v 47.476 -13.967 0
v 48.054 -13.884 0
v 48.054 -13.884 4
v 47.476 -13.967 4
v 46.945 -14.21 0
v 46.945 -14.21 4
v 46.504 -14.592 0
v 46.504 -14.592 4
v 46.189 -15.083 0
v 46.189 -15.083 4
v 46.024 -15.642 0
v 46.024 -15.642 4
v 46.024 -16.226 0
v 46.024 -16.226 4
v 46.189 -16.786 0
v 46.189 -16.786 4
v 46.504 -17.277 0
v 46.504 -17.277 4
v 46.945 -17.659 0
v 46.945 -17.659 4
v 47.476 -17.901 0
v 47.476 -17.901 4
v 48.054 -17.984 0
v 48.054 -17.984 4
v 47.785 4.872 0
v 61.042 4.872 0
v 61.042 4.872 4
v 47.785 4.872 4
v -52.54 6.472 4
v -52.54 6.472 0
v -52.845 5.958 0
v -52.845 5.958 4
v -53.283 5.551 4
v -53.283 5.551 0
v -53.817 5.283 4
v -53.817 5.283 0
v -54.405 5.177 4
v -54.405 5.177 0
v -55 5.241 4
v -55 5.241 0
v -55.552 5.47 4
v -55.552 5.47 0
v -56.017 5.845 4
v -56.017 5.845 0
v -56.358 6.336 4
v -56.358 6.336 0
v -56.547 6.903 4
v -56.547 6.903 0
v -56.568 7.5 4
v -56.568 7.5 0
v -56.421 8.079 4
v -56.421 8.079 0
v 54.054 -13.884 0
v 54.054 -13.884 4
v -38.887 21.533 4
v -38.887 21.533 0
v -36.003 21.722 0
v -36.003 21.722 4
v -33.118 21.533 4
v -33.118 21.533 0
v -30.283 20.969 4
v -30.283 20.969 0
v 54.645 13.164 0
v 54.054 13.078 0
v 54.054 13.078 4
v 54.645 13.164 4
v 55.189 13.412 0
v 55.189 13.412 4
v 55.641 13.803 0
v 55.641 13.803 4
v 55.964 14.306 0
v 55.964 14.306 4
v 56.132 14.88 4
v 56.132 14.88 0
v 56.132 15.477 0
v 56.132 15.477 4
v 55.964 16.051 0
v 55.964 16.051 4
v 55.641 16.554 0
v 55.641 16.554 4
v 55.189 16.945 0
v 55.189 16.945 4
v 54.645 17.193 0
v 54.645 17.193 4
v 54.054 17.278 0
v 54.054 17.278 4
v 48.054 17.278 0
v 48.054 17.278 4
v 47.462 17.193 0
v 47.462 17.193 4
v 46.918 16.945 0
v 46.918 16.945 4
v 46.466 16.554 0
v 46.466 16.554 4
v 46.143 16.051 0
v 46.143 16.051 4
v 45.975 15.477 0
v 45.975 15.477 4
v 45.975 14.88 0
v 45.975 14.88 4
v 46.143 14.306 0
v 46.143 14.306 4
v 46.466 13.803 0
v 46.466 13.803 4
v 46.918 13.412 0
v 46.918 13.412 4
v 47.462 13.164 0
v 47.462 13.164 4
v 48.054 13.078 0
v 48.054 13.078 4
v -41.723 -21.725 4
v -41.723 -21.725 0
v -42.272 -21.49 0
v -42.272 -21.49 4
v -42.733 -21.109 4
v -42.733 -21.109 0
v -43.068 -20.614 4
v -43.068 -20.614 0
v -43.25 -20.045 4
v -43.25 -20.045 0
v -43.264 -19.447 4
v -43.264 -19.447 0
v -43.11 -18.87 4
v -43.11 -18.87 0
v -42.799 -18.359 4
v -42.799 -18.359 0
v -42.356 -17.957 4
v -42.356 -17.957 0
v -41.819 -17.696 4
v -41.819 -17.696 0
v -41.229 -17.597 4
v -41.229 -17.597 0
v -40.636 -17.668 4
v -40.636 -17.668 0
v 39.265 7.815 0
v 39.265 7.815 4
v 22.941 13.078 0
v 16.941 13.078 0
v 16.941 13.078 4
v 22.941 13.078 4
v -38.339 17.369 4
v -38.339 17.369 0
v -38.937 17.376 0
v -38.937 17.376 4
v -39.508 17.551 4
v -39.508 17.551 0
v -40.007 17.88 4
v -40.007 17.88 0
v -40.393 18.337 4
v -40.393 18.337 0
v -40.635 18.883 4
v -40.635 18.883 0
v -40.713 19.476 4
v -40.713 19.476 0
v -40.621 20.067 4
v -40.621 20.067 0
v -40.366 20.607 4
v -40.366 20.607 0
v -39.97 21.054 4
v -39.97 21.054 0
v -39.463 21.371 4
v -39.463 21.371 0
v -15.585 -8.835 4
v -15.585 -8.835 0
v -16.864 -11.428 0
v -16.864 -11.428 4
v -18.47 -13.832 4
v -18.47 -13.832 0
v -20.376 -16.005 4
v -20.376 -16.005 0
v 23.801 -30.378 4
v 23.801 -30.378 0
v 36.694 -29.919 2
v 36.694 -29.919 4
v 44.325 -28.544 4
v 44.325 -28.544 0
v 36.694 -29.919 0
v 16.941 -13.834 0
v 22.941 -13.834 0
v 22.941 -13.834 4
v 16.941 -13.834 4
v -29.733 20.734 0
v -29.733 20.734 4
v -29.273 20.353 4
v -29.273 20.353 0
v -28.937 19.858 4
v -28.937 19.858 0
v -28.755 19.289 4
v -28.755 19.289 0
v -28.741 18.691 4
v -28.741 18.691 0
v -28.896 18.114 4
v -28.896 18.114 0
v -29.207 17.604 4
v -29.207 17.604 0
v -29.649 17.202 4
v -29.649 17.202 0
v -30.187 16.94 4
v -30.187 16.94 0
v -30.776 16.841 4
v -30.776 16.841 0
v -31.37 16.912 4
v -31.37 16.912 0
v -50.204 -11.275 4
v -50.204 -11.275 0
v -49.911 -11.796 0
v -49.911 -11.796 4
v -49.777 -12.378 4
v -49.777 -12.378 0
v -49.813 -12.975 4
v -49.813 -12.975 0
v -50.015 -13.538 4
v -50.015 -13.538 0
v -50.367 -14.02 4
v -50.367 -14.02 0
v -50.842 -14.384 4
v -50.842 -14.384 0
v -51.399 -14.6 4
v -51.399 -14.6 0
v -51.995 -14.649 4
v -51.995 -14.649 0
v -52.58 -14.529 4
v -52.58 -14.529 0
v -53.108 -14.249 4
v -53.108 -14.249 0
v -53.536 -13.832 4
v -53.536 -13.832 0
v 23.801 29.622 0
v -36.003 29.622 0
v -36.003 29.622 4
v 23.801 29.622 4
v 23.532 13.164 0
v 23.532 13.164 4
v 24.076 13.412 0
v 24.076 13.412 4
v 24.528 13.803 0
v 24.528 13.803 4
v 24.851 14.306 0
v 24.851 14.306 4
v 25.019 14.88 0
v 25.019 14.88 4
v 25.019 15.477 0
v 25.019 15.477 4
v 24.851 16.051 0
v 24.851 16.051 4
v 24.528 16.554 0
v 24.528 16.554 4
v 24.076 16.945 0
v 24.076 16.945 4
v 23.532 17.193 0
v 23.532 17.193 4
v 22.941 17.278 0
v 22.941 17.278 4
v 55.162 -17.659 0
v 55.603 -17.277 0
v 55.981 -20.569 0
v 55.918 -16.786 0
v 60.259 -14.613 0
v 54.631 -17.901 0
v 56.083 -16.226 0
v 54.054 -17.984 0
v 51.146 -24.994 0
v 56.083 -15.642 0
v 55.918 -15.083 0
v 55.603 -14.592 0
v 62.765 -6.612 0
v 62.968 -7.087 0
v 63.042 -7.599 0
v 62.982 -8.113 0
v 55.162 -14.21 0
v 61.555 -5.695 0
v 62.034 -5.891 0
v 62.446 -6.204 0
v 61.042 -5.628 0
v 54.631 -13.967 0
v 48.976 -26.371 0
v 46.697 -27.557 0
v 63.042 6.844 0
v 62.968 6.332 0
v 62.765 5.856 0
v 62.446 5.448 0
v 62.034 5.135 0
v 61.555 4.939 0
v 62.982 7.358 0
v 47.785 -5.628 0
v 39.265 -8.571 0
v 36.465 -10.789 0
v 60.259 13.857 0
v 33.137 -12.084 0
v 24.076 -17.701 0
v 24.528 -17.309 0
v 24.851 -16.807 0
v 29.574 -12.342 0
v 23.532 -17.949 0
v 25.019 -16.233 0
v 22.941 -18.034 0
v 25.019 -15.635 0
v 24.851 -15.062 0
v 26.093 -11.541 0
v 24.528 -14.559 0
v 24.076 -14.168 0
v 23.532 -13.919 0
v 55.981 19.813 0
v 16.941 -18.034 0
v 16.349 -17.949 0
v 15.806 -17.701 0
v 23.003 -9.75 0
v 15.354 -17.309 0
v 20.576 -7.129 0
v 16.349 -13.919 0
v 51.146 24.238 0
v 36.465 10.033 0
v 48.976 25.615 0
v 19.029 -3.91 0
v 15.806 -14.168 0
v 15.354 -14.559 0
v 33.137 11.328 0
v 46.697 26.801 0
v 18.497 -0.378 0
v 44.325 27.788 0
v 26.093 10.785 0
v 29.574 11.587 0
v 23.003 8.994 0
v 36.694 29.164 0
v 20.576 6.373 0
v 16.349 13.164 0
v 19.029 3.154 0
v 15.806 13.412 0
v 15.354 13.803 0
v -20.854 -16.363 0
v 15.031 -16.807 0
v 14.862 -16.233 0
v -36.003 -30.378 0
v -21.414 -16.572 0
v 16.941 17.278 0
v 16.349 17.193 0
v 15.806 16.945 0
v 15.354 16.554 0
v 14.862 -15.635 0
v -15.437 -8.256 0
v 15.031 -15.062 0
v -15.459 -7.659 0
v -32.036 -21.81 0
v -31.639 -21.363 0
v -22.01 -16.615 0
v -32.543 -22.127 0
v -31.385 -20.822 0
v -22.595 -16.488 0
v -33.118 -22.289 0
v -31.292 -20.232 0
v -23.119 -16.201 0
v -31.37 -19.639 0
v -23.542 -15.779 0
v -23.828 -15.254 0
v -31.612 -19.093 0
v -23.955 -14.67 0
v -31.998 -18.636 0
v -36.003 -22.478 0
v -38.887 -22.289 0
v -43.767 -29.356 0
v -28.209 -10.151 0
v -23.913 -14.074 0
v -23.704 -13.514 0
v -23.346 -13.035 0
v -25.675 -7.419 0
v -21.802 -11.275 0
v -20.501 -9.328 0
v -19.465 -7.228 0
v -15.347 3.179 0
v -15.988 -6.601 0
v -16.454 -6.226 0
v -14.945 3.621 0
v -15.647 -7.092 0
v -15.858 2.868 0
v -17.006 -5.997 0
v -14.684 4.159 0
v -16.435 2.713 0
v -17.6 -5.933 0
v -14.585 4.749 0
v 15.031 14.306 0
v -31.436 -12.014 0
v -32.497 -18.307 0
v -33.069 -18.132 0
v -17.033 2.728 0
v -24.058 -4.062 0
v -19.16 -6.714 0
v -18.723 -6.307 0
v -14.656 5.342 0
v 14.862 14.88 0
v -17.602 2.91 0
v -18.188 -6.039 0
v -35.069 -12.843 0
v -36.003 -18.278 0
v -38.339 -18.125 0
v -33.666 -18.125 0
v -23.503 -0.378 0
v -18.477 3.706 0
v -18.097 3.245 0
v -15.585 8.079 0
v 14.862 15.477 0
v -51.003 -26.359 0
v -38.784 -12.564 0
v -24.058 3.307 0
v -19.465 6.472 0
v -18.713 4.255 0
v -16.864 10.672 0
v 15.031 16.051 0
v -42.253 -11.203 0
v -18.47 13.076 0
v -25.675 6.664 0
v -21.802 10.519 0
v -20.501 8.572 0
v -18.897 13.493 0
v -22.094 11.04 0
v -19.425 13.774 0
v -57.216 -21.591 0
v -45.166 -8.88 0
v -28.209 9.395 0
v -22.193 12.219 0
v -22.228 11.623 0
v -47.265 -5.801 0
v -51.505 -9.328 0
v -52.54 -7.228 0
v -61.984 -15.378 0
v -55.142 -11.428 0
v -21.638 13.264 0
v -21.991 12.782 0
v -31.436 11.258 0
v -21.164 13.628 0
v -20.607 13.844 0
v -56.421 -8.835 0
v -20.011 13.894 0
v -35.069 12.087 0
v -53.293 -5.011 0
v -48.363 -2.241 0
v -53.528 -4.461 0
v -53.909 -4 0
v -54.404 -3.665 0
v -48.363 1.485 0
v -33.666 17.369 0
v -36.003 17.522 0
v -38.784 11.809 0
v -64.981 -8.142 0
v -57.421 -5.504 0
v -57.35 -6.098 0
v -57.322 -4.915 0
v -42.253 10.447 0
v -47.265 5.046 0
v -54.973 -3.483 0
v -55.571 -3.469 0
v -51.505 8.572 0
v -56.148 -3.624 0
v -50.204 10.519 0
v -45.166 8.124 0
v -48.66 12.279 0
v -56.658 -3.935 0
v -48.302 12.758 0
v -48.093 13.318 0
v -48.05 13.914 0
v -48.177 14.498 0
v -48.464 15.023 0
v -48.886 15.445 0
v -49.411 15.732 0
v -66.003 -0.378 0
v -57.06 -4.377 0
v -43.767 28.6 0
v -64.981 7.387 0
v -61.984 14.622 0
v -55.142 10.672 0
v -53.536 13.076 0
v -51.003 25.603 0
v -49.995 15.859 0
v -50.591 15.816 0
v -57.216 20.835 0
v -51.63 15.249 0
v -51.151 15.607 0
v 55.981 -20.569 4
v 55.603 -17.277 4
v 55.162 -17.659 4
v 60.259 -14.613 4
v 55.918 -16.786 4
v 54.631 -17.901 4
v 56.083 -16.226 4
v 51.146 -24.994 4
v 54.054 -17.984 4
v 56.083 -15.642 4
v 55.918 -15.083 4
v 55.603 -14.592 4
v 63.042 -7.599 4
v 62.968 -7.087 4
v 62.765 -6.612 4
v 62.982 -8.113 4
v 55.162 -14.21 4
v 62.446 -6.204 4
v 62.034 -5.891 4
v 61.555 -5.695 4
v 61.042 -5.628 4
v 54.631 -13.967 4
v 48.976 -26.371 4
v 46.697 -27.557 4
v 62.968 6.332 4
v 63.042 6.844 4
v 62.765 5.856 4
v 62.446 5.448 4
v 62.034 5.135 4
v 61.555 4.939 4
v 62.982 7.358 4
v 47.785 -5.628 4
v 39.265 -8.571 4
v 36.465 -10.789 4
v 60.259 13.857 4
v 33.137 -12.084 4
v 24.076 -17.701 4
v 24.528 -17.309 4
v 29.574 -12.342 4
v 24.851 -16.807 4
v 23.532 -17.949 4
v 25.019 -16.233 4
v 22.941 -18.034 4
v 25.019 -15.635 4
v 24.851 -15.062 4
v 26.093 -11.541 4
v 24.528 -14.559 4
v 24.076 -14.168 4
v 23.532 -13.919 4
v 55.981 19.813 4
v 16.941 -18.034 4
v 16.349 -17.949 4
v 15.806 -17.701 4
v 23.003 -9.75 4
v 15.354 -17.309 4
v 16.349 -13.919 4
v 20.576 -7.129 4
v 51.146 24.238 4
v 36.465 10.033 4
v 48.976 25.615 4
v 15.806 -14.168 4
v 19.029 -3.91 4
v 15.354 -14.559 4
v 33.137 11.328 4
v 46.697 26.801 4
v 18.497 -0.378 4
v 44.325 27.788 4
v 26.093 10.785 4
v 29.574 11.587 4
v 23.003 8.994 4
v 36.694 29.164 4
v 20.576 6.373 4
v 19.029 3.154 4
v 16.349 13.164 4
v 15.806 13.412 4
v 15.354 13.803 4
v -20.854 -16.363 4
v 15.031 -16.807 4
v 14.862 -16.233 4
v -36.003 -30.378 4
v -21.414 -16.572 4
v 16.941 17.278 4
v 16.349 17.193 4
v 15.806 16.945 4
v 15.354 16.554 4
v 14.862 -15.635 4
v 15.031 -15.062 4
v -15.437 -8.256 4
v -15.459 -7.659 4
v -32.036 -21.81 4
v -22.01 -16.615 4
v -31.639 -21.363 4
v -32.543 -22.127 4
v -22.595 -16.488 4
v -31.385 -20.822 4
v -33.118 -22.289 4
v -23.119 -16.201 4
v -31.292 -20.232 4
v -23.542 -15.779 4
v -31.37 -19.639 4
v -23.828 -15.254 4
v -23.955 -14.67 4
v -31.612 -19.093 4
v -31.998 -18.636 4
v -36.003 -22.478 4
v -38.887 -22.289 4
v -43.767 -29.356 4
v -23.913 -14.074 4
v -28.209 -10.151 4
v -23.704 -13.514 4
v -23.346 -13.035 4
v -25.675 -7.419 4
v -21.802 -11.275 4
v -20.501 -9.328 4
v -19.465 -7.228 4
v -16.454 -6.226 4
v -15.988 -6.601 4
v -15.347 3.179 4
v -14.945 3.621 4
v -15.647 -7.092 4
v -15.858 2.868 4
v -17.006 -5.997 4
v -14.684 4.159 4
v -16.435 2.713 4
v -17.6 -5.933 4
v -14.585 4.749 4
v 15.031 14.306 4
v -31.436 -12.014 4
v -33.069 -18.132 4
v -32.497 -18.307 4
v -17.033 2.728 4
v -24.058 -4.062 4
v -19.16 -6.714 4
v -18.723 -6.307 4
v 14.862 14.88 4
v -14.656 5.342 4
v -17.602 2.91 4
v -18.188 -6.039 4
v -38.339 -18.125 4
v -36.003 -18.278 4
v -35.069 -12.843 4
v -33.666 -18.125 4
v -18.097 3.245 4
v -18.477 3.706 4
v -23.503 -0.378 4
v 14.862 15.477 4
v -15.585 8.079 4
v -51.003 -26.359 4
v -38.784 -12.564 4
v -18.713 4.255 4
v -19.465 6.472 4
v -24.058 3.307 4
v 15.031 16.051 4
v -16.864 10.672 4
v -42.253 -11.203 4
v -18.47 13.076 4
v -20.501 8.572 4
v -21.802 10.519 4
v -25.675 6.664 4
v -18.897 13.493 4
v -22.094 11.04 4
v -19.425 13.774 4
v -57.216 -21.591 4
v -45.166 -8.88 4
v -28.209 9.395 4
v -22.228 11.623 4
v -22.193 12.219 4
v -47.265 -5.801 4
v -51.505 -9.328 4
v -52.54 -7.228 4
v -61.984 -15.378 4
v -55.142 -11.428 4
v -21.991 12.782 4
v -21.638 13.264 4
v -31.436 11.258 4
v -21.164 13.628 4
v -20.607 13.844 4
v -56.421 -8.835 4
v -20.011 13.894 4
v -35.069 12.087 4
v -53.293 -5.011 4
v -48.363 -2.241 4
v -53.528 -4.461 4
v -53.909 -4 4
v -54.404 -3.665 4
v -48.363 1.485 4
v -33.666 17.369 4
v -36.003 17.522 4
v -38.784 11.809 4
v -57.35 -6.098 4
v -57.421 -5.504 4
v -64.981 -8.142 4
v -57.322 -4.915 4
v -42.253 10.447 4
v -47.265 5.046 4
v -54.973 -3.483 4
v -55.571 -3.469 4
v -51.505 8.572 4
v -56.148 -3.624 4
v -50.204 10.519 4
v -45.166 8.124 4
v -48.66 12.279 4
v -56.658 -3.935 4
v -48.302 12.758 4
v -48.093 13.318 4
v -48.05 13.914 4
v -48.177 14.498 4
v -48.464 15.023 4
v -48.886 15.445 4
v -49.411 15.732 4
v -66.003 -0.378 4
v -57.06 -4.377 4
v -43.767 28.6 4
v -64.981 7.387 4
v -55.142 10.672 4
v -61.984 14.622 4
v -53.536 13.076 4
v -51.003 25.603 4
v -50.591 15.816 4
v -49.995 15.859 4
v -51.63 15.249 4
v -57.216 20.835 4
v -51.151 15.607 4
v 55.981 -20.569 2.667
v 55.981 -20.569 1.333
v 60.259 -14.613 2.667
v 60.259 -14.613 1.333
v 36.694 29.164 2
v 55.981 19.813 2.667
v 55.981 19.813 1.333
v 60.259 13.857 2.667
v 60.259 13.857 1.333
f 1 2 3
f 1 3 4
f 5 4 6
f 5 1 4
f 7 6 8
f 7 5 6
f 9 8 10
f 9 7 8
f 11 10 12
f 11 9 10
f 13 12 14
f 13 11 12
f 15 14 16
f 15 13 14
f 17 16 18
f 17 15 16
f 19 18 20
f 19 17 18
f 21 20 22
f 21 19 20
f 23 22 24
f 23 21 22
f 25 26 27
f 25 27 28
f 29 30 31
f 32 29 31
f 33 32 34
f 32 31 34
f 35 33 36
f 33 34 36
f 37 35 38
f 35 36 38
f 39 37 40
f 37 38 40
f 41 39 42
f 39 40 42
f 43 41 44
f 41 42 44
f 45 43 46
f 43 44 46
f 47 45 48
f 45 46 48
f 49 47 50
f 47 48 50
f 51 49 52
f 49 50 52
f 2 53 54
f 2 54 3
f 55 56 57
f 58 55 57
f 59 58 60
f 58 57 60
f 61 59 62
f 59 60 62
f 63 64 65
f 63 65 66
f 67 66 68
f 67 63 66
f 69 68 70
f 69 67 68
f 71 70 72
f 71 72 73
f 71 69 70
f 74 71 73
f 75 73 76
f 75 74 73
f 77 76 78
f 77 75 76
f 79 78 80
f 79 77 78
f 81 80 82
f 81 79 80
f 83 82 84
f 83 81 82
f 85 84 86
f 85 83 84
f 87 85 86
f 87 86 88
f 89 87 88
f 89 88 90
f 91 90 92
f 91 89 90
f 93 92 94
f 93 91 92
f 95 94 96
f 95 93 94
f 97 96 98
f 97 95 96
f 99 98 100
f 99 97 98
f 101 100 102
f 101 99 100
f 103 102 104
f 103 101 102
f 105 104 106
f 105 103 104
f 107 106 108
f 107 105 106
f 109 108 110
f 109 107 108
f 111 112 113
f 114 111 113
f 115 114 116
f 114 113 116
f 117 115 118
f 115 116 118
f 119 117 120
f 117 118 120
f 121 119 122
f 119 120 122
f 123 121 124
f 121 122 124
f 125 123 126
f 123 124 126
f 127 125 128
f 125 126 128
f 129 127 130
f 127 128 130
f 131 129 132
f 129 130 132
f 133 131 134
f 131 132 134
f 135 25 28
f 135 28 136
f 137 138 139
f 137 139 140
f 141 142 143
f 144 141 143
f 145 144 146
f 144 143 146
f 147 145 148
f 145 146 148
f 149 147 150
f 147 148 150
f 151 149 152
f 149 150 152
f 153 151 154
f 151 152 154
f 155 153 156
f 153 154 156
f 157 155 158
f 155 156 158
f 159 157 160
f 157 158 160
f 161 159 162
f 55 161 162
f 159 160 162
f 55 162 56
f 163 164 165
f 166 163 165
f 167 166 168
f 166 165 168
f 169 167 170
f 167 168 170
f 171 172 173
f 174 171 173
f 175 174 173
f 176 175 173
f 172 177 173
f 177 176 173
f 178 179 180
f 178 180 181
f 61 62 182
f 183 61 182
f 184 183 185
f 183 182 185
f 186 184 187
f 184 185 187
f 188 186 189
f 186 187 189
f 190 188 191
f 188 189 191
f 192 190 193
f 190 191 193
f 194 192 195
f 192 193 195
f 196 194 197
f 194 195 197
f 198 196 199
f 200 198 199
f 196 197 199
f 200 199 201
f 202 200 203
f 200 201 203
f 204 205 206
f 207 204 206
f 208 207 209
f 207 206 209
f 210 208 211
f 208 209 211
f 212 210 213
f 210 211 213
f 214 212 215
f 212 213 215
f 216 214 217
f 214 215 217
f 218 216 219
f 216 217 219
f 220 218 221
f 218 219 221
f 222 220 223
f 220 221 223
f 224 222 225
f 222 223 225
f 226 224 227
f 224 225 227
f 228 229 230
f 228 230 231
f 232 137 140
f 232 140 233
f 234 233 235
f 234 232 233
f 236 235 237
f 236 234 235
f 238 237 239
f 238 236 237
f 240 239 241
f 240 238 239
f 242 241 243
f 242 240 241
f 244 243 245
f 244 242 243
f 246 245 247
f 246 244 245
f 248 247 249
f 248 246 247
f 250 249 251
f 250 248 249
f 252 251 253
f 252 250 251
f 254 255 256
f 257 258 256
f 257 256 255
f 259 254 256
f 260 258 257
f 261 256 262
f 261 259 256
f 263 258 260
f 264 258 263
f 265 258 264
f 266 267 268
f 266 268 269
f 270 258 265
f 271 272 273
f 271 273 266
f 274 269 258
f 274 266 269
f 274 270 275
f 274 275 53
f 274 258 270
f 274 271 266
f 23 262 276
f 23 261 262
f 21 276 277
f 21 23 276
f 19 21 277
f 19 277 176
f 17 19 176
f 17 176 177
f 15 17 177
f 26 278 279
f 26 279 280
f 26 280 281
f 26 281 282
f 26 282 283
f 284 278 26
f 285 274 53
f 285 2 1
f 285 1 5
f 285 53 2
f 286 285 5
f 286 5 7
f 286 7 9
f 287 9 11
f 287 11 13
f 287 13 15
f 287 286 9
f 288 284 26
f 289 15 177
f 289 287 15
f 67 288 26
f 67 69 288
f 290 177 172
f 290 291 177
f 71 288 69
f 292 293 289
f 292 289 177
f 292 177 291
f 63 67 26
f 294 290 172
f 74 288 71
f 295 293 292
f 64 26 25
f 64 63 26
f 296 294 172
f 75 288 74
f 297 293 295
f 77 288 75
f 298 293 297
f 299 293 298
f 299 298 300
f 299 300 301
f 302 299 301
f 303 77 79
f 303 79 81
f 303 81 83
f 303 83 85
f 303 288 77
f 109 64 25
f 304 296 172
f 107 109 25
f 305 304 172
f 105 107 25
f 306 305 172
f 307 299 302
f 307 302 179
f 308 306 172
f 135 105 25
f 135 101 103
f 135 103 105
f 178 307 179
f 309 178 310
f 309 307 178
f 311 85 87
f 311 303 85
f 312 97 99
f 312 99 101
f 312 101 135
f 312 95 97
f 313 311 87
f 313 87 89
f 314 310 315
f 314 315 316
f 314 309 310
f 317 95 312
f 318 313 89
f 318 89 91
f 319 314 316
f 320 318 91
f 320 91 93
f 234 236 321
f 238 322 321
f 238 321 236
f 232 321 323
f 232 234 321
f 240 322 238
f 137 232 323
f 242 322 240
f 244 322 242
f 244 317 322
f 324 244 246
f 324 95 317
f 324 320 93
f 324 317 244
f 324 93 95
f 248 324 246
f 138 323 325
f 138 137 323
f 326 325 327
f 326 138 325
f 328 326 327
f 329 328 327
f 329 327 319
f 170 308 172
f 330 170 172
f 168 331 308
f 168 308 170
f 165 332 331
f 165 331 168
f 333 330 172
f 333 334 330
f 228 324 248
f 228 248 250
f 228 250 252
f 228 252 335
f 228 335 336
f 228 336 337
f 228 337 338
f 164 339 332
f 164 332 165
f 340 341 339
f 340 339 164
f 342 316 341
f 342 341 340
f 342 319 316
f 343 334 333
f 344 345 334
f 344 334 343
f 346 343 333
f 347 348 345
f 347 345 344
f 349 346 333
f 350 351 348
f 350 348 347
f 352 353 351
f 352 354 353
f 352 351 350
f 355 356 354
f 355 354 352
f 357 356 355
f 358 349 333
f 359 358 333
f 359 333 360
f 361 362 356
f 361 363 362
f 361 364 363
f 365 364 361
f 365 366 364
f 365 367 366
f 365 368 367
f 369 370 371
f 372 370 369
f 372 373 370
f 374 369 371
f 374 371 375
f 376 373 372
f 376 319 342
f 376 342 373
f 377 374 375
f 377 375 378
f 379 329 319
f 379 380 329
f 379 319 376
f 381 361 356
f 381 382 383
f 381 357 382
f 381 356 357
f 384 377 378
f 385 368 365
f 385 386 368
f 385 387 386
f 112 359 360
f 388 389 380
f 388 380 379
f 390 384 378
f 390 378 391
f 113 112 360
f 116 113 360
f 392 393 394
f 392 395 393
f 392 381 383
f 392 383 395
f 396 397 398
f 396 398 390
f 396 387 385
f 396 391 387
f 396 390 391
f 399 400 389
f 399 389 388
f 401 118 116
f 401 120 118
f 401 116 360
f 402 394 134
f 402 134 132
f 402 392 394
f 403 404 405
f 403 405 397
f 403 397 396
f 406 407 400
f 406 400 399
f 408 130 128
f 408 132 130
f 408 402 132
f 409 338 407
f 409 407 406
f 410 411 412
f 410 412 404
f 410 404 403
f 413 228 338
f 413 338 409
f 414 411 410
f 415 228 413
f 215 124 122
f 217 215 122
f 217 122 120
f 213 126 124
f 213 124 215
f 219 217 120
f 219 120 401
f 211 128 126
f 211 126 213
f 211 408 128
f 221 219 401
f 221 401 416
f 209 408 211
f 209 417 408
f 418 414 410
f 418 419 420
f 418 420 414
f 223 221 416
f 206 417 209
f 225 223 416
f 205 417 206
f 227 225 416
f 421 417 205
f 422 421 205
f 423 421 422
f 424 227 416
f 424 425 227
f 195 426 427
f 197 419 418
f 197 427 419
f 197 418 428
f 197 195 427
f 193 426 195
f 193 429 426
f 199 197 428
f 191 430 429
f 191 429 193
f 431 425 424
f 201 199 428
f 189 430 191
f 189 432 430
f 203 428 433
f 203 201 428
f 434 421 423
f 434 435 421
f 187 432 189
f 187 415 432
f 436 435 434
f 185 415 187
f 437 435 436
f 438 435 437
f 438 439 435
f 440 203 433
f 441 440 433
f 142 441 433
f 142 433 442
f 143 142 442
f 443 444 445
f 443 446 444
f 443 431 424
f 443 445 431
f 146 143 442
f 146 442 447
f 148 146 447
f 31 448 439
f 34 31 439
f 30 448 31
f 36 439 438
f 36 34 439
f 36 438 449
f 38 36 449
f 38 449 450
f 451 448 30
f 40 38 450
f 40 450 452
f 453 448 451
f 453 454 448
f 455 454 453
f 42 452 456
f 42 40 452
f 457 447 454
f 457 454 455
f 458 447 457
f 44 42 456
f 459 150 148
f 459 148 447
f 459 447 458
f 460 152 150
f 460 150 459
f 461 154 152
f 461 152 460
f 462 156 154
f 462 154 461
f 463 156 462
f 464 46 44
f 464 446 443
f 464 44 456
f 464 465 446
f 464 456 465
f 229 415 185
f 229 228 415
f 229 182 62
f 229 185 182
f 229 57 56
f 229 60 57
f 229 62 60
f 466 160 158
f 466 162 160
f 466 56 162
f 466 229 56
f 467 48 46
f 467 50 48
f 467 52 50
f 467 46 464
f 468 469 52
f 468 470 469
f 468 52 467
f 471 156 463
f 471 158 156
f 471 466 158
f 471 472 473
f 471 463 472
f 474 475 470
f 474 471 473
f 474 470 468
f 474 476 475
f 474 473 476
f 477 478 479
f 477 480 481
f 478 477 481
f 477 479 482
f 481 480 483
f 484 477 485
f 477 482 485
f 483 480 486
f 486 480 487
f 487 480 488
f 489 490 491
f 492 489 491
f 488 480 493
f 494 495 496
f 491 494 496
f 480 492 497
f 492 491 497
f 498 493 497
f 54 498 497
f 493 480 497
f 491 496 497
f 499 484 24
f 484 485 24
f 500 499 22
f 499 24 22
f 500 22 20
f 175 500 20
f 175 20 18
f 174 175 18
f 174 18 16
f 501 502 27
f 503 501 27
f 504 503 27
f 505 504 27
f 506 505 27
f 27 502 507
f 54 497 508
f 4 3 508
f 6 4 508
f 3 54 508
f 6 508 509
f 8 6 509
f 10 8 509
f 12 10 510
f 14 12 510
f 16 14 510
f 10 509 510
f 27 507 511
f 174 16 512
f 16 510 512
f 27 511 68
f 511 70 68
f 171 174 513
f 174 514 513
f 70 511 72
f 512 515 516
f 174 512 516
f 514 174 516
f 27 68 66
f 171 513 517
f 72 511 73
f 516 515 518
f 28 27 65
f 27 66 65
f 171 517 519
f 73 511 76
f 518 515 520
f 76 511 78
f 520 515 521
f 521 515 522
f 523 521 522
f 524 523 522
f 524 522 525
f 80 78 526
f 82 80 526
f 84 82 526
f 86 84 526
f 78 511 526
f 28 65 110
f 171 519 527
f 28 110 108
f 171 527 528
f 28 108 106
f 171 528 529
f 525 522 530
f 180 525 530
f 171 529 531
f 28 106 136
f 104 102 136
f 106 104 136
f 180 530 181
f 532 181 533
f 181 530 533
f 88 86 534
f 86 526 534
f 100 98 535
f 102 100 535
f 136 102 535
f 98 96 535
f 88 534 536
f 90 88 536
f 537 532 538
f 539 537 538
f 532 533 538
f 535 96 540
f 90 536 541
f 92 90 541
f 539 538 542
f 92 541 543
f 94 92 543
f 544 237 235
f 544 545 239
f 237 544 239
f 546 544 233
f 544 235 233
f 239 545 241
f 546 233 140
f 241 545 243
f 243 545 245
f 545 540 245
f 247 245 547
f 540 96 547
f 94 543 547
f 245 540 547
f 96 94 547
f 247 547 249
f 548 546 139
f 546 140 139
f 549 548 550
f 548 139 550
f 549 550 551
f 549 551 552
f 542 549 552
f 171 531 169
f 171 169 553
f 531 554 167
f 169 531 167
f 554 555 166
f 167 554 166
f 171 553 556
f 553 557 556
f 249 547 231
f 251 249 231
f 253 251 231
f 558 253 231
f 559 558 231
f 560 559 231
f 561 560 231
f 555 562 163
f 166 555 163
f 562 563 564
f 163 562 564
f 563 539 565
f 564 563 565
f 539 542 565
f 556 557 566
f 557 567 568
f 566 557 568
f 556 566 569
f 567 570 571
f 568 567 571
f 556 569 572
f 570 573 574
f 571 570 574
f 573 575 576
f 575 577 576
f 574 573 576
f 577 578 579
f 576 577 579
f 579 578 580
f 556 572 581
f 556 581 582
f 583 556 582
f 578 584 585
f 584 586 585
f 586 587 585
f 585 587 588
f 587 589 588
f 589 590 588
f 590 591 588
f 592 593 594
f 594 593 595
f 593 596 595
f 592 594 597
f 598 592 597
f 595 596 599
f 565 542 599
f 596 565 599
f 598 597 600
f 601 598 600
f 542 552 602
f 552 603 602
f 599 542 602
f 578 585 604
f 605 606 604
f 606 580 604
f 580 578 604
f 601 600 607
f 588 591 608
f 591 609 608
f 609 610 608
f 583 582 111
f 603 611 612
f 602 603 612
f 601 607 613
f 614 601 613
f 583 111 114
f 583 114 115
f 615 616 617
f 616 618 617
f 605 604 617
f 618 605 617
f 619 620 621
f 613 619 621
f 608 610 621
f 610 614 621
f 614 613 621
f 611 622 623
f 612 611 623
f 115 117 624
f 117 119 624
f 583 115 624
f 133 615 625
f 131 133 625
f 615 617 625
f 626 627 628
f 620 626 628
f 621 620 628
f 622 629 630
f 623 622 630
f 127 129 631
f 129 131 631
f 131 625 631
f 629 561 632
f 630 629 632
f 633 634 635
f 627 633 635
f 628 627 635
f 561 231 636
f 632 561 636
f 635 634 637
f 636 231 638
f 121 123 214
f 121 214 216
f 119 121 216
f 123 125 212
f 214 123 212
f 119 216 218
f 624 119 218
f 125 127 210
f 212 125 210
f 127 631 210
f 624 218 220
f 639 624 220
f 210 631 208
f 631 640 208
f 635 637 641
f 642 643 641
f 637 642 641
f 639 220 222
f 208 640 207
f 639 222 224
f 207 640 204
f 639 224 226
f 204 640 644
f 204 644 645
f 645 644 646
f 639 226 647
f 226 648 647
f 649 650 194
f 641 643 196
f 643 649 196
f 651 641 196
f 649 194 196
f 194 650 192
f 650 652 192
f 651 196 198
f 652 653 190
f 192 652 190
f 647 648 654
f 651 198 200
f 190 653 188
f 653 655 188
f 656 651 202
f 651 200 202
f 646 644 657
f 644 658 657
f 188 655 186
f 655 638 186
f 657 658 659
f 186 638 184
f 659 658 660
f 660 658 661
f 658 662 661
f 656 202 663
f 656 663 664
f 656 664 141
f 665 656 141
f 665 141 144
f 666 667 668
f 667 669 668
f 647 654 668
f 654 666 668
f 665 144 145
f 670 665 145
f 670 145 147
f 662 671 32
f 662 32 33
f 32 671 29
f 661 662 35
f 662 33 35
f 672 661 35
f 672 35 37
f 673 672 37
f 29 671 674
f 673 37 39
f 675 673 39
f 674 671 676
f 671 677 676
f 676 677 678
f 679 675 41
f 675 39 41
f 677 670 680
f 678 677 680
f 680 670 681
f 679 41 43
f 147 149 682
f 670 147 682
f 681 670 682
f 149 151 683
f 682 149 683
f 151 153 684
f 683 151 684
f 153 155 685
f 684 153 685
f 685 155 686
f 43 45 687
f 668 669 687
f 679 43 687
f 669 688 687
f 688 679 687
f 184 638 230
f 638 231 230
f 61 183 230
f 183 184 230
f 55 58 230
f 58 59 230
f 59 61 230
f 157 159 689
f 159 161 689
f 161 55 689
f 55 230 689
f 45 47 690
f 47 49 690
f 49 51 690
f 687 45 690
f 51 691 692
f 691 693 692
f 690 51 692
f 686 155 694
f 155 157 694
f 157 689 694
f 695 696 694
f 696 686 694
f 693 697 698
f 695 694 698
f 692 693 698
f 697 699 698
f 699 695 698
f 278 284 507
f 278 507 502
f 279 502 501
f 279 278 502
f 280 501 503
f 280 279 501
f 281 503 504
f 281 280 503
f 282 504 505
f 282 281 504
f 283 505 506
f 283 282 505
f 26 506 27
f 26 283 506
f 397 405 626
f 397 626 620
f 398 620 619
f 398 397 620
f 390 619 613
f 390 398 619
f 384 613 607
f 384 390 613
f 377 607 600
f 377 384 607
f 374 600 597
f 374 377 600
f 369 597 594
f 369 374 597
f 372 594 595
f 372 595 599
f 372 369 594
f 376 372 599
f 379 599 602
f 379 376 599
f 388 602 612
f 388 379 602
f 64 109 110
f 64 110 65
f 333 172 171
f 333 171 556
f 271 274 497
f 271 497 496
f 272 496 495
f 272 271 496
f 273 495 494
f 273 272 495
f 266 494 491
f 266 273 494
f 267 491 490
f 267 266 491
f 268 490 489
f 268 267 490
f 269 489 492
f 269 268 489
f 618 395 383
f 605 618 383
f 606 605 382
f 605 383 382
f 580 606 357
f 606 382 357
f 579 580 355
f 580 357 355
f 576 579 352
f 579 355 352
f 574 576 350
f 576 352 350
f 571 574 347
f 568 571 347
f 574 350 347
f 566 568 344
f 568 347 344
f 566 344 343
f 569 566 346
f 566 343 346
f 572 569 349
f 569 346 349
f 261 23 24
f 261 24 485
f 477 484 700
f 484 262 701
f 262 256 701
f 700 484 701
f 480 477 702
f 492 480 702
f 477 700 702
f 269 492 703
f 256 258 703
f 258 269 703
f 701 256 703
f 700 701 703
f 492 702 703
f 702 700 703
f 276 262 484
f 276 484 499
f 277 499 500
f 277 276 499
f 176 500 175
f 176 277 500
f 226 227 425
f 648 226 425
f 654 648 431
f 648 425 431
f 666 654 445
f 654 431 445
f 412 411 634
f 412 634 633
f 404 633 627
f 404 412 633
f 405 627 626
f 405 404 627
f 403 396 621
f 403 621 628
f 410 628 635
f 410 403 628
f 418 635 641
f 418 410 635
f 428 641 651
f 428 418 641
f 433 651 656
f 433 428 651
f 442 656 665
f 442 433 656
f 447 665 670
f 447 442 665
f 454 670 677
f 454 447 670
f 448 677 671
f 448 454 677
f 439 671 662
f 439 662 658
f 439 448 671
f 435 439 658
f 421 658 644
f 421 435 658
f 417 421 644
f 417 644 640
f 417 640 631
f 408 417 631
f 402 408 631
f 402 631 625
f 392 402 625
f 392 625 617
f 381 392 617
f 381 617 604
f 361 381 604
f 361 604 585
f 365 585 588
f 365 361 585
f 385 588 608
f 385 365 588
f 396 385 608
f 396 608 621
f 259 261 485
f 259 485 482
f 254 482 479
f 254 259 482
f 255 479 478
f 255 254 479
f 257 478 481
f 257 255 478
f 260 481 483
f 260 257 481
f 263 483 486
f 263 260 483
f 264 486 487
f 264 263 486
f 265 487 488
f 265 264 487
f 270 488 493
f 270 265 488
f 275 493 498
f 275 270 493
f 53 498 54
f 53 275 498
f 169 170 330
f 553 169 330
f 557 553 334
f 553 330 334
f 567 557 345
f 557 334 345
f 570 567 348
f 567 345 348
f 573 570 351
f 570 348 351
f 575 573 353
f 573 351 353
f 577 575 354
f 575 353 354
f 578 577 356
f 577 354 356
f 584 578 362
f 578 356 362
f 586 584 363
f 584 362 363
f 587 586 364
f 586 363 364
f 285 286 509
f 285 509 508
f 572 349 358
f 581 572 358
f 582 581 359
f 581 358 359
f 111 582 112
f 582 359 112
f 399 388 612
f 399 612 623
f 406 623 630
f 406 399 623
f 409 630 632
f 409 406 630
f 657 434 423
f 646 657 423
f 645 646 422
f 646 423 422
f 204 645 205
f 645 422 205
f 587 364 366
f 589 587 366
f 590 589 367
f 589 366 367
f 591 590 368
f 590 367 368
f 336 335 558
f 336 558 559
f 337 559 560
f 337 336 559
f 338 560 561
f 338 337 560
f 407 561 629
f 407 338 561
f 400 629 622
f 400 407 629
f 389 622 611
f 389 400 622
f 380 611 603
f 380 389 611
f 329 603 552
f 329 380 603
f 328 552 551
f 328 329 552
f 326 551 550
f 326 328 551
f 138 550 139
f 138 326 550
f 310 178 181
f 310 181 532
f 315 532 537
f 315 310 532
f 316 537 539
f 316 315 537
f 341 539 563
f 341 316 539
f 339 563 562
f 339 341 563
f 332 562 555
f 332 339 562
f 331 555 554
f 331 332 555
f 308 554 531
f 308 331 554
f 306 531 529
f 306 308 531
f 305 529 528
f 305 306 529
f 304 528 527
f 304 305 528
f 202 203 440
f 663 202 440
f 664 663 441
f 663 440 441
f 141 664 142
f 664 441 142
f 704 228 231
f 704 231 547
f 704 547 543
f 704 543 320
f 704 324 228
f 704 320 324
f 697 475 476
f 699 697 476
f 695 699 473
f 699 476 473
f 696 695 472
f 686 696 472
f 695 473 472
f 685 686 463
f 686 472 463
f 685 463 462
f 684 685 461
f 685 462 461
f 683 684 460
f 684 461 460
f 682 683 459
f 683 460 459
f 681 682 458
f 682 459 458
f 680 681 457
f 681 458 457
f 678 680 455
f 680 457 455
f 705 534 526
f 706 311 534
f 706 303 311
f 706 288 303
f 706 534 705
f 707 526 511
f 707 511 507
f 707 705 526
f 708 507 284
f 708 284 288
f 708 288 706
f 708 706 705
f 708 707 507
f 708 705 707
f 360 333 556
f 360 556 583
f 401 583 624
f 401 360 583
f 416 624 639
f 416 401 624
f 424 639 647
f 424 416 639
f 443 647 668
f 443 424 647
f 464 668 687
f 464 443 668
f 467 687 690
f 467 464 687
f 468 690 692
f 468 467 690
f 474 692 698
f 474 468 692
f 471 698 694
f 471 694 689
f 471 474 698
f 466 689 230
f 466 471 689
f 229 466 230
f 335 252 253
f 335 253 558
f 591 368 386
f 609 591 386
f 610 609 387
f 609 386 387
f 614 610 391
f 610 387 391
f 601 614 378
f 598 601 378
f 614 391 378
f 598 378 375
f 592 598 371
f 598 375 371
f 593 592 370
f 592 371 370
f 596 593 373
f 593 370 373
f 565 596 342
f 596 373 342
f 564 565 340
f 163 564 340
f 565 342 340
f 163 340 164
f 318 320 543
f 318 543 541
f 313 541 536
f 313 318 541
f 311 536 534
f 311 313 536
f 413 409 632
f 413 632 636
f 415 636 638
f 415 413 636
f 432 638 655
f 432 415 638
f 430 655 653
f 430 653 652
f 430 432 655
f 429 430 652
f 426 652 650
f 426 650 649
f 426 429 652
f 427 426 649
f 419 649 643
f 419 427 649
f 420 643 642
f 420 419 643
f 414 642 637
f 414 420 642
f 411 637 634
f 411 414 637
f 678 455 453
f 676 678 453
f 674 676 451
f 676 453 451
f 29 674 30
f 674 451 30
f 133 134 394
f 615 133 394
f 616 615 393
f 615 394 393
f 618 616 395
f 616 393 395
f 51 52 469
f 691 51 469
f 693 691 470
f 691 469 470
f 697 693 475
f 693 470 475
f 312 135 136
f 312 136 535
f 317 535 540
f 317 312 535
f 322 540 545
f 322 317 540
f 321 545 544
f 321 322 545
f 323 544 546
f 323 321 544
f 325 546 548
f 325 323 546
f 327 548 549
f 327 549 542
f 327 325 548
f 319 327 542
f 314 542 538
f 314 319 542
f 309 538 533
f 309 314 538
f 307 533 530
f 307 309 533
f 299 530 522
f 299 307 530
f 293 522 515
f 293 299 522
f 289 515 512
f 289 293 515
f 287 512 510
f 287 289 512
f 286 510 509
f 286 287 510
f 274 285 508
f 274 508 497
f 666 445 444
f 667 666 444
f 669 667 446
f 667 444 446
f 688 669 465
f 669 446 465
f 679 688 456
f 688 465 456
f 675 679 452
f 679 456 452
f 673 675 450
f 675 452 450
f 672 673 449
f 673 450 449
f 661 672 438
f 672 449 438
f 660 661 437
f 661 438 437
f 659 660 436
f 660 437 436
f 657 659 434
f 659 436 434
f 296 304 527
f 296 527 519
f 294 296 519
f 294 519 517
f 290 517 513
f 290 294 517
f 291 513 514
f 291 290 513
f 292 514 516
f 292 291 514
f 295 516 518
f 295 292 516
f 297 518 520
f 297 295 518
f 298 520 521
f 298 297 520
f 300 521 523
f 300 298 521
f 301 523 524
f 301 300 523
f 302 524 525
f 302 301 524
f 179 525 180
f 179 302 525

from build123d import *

# Parameters (mm, degrees)
SKIZZE2_R                       = 12.5
AUFSATZ_LINEAR_AUSTRAGEN2_DEPTH = 4


with BuildPart() as part:
    # Skizze2 → Aufsatz-Linear austragen2 (new body)
    with BuildSketch(Plane.XY):
        with BuildLine():
            Line((-36.002800277, 29.622112019), (23.801047301, 29.622112019))
            add(Edge.make_bspline(
                [(23.801047301, 29.622112019), (39.324007896, 29.622112019), (44.325198534, 27.788269736)],
                knots=[0, 0, 0, 1, 1, 1], degree=2))
            ThreePointArc((44.325198534, 27.788269736), (47.84965812, 26.232437014), (51.145668645, 24.237757727))
            add(Edge.make_bspline(
                [(51.145668645, 24.237757727), (55.926029521, 20.907523335), (61.370340825, 13.799078949), (62.982460357, 7.357685339)],
                knots=[0, 0, 0, 0, 1, 1, 1, 1], degree=3))
            ThreePointArc((62.982460357, 7.357685339), (62.618871056, 5.641491574), (61.042300943, 4.872112019))
            Line((61.042300943, 4.872112019), (47.785287356, 4.872112019))
            Line((47.785287356, 4.872112019), (39.265024534, 7.815111963))
            ThreePointArc((39.265024534, 7.815111963), (18.497199723, -0.377887981), (39.265024534, -8.570887926))
            Line((39.265024534, -8.570887926), (47.785287356, -5.627887981))
            Line((47.785287356, -5.627887981), (61.042300943, -5.627887981))
            ThreePointArc((61.042300943, -5.627887981), (62.618871056, -6.397267536), (62.982460357, -8.113461302))
            add(Edge.make_bspline(
                [(51.145668645, -24.99353369), (55.926029521, -21.663299298), (61.370340825, -14.554854912), (62.982460357, -8.113461302)],
                knots=[0, 0, 0, 0, 1, 1, 1, 1], degree=3))
            ThreePointArc((51.145668645, -24.99353369), (47.84965812, -26.988212977), (44.325198534, -28.544045699))
            add(Edge.make_bspline(
                [(23.801047301, -30.377887981), (39.324007896, -30.377887981), (44.325198534, -28.544045699)],
                knots=[0, 0, 0, 1, 1, 1], degree=2))
            Line((23.801047301, -30.377887981), (-36.002800277, -30.377887981))
            ThreePointArc((-36.002800277, -30.377887981), (-66.002800277, -0.377887981), (-36.002800277, 29.622112019))
        make_face()
        with Locations((-36.002800277, -0.377887981)):
            Circle(SKIZZE2_R, mode=Mode.SUBTRACT)
        with BuildLine():
            Line((22.940850537, 17.278461205), (16.940850537, 17.278461205))
            ThreePointArc((16.940850537, 17.278461205), (14.840850537, 15.178461205), (16.940850537, 13.078461205))
            Line((16.940850537, 13.078461205), (22.940850537, 13.078461205))
            ThreePointArc((22.940850537, 13.078461205), (25.040850537, 15.178461205), (22.940850537, 17.278461205))
        make_face(mode=Mode.SUBTRACT)
        with BuildLine():
            Line((48.05354891, 13.078461205), (54.05354891, 13.078461205))
            ThreePointArc((54.05354891, 13.078461205), (56.15354891, 15.178461205), (54.05354891, 17.278461205))
            Line((54.05354891, 17.278461205), (48.05354891, 17.278461205))
            ThreePointArc((48.05354891, 17.278461205), (45.95354891, 15.178461205), (48.05354891, 13.078461205))
        make_face(mode=Mode.SUBTRACT)
        with BuildLine():
            Line((48.05354891, -17.984237167), (54.05354891, -17.984237167))
            ThreePointArc((54.05354891, -17.984237167), (56.10354891, -15.934237167), (54.05354891, -13.884237167))
            Line((54.05354891, -13.884237167), (48.05354891, -13.884237167))
            ThreePointArc((48.05354891, -13.884237167), (46.00354891, -15.934237167), (48.05354891, -17.984237167))
        make_face(mode=Mode.SUBTRACT)
        with BuildLine():
            Line((22.940850537, -13.834237167), (16.940850537, -13.834237167))
            ThreePointArc((16.940850537, -13.834237167), (14.840850537, -15.934237167), (16.940850537, -18.034237167))
            Line((16.940850537, -18.034237167), (22.940850537, -18.034237167))
            ThreePointArc((22.940850537, -18.034237167), (25.040850537, -15.934237167), (22.940850537, -13.834237167))
        make_face(mode=Mode.SUBTRACT)
        with BuildLine():
            ThreePointArc((-23.345588893, -13.035099365), (-21.119494216, -10.322595152), (-19.465356645, -7.227921421))
            ThreePointArc((-19.465356645, -7.227921421), (-16.721574418, -6.09140961), (-15.585062608, -8.835191837))
            ThreePointArc((-15.585062608, -8.835191837), (-17.627321845, -12.655990131), (-20.375740412, -16.004947846))
            ThreePointArc((-20.375740412, -16.004947846), (-23.345588893, -16.004947846), (-23.345588893, -13.035099365))
        make_face(mode=Mode.SUBTRACT)
        with BuildLine():
            ThreePointArc((-40.635661184, -17.667960272), (-37.17351629, -18.239562707), (-33.666381436, -18.124751))
            ThreePointArc((-33.666381436, -18.124751), (-31.310242223, -19.932680205), (-33.118171429, -22.288819418))
            ThreePointArc((-33.118171429, -22.288819418), (-37.448209433, -22.430570185), (-41.722701173, -21.724848742))
            ThreePointArc((-41.722701173, -21.724848742), (-43.207625414, -19.152884512), (-40.635661184, -17.667960272))
        make_face(mode=Mode.SUBTRACT)
        with BuildLine():
            ThreePointArc((-53.292872567, -5.010748889), (-52.05682235, -8.294855536), (-50.203825068, -11.274717561))
            ThreePointArc((-50.203825068, -11.274717561), (-50.591468081, -14.219158576), (-53.535909097, -13.831515562))
            ThreePointArc((-53.535909097, -13.831515562), (-55.823687864, -10.152468035), (-57.349761038, -6.097788878))
            ThreePointArc((-57.349761038, -6.097788878), (-55.864836797, -3.525824648), (-53.292872567, -5.010748889))
        make_face(mode=Mode.SUBTRACT)
        with BuildLine():
            ThreePointArc((-48.66001166, 12.279323402), (-50.886106337, 9.56681919), (-52.540243909, 6.472145458))
            ThreePointArc((-52.540243909, 6.472145458), (-55.284026135, 5.335633648), (-56.420537945, 8.079415874))
            ThreePointArc((-56.420537945, 8.079415874), (-54.378278708, 11.900214168), (-51.629860141, 15.249171883))
            ThreePointArc((-51.629860141, 15.249171883), (-48.66001166, 15.249171883), (-48.66001166, 12.279323402))
        make_face(mode=Mode.SUBTRACT)
        with BuildLine():
            ThreePointArc((-31.369939369, 16.912184309), (-34.832084263, 17.483786745), (-38.339219117, 17.368975037))
            ThreePointArc((-38.339219117, 17.368975037), (-40.69535833, 19.176904242), (-38.887429125, 21.533043455))
            ThreePointArc((-38.887429125, 21.533043455), (-34.557391121, 21.674794222), (-30.28289938, 20.96907278))
            ThreePointArc((-30.28289938, 20.96907278), (-28.797975139, 18.39710855), (-31.369939369, 16.912184309))
        make_face(mode=Mode.SUBTRACT)
        with BuildLine():
            ThreePointArc((-18.712727986, 4.254972926), (-16.140763756, 2.770048686), (-14.655839516, 5.342012915))
            ThreePointArc((-14.655839516, 5.342012915), (-16.181912689, 9.396692073), (-18.469691456, 13.0757396))
            ThreePointArc((-18.469691456, 13.0757396), (-21.414132472, 13.463382613), (-21.801775485, 10.518941598))
            ThreePointArc((-21.801775485, 10.518941598), (-19.948778203, 7.539079574), (-18.712727986, 4.254972926))
        make_face(mode=Mode.SUBTRACT)
    extrude(amount=AUFSATZ_LINEAR_AUSTRAGEN2_DEPTH)


solid = part.part
